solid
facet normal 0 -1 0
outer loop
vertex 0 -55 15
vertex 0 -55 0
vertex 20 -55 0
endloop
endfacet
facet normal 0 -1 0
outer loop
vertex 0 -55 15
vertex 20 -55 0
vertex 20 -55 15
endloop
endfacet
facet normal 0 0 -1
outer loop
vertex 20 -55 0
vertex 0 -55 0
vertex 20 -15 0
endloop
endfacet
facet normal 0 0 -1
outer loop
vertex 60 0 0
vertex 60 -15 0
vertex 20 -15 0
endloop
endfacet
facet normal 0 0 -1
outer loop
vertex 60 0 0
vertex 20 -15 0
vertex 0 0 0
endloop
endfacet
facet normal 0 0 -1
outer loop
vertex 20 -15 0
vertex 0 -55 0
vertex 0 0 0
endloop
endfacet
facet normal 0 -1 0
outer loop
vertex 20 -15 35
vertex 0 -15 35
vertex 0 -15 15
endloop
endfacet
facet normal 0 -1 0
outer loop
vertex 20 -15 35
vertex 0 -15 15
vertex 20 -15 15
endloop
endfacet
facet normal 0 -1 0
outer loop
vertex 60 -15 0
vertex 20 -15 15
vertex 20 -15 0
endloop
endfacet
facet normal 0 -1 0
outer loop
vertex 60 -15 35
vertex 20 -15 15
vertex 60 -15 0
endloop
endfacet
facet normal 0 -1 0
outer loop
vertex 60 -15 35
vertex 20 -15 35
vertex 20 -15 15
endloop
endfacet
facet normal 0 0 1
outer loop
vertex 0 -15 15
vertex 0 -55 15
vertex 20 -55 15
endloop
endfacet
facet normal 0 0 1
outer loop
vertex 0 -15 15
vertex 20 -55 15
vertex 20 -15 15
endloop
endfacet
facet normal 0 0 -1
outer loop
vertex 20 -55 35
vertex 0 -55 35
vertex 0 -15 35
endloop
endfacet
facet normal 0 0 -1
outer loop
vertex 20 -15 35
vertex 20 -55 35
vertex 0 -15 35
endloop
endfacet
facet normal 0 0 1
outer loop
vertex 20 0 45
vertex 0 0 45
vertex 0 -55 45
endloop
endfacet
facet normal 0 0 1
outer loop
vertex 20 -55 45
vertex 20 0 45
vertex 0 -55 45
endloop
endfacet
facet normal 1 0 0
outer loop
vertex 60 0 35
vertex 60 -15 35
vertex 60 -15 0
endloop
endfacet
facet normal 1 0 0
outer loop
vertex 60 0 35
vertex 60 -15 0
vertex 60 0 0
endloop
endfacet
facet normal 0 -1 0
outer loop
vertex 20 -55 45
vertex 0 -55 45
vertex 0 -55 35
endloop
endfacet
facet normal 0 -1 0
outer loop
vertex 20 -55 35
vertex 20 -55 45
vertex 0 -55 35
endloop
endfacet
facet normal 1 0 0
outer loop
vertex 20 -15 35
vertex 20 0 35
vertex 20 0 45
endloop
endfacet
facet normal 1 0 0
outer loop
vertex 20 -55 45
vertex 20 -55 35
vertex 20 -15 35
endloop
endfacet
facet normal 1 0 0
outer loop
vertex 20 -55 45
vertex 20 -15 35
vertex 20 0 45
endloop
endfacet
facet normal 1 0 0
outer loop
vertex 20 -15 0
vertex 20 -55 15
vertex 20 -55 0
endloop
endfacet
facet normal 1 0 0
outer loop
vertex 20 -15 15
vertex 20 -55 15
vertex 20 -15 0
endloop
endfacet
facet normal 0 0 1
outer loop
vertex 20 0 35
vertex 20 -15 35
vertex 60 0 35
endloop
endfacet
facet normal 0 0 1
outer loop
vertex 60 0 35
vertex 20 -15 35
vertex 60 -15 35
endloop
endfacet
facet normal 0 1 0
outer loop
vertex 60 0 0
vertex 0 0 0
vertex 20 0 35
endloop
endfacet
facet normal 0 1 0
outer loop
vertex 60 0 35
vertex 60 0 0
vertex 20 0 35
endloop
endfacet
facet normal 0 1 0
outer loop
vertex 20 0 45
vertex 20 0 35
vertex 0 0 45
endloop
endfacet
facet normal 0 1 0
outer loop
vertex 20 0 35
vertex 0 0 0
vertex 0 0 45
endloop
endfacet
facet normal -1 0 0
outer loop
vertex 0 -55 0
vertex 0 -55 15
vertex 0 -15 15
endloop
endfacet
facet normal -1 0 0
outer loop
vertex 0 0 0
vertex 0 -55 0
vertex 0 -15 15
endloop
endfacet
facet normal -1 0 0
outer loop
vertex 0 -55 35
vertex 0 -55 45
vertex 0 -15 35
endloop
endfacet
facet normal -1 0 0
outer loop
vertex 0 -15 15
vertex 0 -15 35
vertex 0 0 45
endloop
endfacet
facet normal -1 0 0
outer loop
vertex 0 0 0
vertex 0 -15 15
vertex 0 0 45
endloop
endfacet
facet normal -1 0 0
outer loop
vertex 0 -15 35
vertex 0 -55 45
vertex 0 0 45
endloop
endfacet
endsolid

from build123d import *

# Parameters (mm, degrees)
F0_W     = 40
F0_H     = 15
F1_DEPTH = 60
F2_W     = 40
F2_H     = 40
F3_DEPTH = 45.001
F4_W     = 40
F4_H     = 10
F5_DEPTH = 25


with BuildPart() as f1:
    # F0 (on Right) → F1 (new body)
    with BuildSketch(Plane.YZ):
        Polygon((-15, 0), (0, 0), (0, 27.873229), (-15, 27.873229), (-15, 15), align=None)
        with Locations((-35, 7.5)):
            Rectangle(F0_W, F0_H)
        Polygon((-15, 27.873229), (0, 27.873229), (0, 45), (-55, 45), (-55, 35), (-15, 35), align=None)
    extrude(amount=F1_DEPTH)

    # F2 (on face) → F3 (cut, through all)
    with BuildSketch(Plane.XY.offset(45)):
        with Locations((40, -35)):
            Rectangle(F2_W, F2_H)
    extrude(amount=-F3_DEPTH, mode=Mode.SUBTRACT)

    # F4 (on face) → F5 (cut)
    with BuildSketch(Plane.XZ.offset(15)):
        with Locations((40, 40)):
            Rectangle(F4_W, F4_H)
    extrude(amount=-F5_DEPTH, mode=Mode.SUBTRACT)


solid = f1.part
